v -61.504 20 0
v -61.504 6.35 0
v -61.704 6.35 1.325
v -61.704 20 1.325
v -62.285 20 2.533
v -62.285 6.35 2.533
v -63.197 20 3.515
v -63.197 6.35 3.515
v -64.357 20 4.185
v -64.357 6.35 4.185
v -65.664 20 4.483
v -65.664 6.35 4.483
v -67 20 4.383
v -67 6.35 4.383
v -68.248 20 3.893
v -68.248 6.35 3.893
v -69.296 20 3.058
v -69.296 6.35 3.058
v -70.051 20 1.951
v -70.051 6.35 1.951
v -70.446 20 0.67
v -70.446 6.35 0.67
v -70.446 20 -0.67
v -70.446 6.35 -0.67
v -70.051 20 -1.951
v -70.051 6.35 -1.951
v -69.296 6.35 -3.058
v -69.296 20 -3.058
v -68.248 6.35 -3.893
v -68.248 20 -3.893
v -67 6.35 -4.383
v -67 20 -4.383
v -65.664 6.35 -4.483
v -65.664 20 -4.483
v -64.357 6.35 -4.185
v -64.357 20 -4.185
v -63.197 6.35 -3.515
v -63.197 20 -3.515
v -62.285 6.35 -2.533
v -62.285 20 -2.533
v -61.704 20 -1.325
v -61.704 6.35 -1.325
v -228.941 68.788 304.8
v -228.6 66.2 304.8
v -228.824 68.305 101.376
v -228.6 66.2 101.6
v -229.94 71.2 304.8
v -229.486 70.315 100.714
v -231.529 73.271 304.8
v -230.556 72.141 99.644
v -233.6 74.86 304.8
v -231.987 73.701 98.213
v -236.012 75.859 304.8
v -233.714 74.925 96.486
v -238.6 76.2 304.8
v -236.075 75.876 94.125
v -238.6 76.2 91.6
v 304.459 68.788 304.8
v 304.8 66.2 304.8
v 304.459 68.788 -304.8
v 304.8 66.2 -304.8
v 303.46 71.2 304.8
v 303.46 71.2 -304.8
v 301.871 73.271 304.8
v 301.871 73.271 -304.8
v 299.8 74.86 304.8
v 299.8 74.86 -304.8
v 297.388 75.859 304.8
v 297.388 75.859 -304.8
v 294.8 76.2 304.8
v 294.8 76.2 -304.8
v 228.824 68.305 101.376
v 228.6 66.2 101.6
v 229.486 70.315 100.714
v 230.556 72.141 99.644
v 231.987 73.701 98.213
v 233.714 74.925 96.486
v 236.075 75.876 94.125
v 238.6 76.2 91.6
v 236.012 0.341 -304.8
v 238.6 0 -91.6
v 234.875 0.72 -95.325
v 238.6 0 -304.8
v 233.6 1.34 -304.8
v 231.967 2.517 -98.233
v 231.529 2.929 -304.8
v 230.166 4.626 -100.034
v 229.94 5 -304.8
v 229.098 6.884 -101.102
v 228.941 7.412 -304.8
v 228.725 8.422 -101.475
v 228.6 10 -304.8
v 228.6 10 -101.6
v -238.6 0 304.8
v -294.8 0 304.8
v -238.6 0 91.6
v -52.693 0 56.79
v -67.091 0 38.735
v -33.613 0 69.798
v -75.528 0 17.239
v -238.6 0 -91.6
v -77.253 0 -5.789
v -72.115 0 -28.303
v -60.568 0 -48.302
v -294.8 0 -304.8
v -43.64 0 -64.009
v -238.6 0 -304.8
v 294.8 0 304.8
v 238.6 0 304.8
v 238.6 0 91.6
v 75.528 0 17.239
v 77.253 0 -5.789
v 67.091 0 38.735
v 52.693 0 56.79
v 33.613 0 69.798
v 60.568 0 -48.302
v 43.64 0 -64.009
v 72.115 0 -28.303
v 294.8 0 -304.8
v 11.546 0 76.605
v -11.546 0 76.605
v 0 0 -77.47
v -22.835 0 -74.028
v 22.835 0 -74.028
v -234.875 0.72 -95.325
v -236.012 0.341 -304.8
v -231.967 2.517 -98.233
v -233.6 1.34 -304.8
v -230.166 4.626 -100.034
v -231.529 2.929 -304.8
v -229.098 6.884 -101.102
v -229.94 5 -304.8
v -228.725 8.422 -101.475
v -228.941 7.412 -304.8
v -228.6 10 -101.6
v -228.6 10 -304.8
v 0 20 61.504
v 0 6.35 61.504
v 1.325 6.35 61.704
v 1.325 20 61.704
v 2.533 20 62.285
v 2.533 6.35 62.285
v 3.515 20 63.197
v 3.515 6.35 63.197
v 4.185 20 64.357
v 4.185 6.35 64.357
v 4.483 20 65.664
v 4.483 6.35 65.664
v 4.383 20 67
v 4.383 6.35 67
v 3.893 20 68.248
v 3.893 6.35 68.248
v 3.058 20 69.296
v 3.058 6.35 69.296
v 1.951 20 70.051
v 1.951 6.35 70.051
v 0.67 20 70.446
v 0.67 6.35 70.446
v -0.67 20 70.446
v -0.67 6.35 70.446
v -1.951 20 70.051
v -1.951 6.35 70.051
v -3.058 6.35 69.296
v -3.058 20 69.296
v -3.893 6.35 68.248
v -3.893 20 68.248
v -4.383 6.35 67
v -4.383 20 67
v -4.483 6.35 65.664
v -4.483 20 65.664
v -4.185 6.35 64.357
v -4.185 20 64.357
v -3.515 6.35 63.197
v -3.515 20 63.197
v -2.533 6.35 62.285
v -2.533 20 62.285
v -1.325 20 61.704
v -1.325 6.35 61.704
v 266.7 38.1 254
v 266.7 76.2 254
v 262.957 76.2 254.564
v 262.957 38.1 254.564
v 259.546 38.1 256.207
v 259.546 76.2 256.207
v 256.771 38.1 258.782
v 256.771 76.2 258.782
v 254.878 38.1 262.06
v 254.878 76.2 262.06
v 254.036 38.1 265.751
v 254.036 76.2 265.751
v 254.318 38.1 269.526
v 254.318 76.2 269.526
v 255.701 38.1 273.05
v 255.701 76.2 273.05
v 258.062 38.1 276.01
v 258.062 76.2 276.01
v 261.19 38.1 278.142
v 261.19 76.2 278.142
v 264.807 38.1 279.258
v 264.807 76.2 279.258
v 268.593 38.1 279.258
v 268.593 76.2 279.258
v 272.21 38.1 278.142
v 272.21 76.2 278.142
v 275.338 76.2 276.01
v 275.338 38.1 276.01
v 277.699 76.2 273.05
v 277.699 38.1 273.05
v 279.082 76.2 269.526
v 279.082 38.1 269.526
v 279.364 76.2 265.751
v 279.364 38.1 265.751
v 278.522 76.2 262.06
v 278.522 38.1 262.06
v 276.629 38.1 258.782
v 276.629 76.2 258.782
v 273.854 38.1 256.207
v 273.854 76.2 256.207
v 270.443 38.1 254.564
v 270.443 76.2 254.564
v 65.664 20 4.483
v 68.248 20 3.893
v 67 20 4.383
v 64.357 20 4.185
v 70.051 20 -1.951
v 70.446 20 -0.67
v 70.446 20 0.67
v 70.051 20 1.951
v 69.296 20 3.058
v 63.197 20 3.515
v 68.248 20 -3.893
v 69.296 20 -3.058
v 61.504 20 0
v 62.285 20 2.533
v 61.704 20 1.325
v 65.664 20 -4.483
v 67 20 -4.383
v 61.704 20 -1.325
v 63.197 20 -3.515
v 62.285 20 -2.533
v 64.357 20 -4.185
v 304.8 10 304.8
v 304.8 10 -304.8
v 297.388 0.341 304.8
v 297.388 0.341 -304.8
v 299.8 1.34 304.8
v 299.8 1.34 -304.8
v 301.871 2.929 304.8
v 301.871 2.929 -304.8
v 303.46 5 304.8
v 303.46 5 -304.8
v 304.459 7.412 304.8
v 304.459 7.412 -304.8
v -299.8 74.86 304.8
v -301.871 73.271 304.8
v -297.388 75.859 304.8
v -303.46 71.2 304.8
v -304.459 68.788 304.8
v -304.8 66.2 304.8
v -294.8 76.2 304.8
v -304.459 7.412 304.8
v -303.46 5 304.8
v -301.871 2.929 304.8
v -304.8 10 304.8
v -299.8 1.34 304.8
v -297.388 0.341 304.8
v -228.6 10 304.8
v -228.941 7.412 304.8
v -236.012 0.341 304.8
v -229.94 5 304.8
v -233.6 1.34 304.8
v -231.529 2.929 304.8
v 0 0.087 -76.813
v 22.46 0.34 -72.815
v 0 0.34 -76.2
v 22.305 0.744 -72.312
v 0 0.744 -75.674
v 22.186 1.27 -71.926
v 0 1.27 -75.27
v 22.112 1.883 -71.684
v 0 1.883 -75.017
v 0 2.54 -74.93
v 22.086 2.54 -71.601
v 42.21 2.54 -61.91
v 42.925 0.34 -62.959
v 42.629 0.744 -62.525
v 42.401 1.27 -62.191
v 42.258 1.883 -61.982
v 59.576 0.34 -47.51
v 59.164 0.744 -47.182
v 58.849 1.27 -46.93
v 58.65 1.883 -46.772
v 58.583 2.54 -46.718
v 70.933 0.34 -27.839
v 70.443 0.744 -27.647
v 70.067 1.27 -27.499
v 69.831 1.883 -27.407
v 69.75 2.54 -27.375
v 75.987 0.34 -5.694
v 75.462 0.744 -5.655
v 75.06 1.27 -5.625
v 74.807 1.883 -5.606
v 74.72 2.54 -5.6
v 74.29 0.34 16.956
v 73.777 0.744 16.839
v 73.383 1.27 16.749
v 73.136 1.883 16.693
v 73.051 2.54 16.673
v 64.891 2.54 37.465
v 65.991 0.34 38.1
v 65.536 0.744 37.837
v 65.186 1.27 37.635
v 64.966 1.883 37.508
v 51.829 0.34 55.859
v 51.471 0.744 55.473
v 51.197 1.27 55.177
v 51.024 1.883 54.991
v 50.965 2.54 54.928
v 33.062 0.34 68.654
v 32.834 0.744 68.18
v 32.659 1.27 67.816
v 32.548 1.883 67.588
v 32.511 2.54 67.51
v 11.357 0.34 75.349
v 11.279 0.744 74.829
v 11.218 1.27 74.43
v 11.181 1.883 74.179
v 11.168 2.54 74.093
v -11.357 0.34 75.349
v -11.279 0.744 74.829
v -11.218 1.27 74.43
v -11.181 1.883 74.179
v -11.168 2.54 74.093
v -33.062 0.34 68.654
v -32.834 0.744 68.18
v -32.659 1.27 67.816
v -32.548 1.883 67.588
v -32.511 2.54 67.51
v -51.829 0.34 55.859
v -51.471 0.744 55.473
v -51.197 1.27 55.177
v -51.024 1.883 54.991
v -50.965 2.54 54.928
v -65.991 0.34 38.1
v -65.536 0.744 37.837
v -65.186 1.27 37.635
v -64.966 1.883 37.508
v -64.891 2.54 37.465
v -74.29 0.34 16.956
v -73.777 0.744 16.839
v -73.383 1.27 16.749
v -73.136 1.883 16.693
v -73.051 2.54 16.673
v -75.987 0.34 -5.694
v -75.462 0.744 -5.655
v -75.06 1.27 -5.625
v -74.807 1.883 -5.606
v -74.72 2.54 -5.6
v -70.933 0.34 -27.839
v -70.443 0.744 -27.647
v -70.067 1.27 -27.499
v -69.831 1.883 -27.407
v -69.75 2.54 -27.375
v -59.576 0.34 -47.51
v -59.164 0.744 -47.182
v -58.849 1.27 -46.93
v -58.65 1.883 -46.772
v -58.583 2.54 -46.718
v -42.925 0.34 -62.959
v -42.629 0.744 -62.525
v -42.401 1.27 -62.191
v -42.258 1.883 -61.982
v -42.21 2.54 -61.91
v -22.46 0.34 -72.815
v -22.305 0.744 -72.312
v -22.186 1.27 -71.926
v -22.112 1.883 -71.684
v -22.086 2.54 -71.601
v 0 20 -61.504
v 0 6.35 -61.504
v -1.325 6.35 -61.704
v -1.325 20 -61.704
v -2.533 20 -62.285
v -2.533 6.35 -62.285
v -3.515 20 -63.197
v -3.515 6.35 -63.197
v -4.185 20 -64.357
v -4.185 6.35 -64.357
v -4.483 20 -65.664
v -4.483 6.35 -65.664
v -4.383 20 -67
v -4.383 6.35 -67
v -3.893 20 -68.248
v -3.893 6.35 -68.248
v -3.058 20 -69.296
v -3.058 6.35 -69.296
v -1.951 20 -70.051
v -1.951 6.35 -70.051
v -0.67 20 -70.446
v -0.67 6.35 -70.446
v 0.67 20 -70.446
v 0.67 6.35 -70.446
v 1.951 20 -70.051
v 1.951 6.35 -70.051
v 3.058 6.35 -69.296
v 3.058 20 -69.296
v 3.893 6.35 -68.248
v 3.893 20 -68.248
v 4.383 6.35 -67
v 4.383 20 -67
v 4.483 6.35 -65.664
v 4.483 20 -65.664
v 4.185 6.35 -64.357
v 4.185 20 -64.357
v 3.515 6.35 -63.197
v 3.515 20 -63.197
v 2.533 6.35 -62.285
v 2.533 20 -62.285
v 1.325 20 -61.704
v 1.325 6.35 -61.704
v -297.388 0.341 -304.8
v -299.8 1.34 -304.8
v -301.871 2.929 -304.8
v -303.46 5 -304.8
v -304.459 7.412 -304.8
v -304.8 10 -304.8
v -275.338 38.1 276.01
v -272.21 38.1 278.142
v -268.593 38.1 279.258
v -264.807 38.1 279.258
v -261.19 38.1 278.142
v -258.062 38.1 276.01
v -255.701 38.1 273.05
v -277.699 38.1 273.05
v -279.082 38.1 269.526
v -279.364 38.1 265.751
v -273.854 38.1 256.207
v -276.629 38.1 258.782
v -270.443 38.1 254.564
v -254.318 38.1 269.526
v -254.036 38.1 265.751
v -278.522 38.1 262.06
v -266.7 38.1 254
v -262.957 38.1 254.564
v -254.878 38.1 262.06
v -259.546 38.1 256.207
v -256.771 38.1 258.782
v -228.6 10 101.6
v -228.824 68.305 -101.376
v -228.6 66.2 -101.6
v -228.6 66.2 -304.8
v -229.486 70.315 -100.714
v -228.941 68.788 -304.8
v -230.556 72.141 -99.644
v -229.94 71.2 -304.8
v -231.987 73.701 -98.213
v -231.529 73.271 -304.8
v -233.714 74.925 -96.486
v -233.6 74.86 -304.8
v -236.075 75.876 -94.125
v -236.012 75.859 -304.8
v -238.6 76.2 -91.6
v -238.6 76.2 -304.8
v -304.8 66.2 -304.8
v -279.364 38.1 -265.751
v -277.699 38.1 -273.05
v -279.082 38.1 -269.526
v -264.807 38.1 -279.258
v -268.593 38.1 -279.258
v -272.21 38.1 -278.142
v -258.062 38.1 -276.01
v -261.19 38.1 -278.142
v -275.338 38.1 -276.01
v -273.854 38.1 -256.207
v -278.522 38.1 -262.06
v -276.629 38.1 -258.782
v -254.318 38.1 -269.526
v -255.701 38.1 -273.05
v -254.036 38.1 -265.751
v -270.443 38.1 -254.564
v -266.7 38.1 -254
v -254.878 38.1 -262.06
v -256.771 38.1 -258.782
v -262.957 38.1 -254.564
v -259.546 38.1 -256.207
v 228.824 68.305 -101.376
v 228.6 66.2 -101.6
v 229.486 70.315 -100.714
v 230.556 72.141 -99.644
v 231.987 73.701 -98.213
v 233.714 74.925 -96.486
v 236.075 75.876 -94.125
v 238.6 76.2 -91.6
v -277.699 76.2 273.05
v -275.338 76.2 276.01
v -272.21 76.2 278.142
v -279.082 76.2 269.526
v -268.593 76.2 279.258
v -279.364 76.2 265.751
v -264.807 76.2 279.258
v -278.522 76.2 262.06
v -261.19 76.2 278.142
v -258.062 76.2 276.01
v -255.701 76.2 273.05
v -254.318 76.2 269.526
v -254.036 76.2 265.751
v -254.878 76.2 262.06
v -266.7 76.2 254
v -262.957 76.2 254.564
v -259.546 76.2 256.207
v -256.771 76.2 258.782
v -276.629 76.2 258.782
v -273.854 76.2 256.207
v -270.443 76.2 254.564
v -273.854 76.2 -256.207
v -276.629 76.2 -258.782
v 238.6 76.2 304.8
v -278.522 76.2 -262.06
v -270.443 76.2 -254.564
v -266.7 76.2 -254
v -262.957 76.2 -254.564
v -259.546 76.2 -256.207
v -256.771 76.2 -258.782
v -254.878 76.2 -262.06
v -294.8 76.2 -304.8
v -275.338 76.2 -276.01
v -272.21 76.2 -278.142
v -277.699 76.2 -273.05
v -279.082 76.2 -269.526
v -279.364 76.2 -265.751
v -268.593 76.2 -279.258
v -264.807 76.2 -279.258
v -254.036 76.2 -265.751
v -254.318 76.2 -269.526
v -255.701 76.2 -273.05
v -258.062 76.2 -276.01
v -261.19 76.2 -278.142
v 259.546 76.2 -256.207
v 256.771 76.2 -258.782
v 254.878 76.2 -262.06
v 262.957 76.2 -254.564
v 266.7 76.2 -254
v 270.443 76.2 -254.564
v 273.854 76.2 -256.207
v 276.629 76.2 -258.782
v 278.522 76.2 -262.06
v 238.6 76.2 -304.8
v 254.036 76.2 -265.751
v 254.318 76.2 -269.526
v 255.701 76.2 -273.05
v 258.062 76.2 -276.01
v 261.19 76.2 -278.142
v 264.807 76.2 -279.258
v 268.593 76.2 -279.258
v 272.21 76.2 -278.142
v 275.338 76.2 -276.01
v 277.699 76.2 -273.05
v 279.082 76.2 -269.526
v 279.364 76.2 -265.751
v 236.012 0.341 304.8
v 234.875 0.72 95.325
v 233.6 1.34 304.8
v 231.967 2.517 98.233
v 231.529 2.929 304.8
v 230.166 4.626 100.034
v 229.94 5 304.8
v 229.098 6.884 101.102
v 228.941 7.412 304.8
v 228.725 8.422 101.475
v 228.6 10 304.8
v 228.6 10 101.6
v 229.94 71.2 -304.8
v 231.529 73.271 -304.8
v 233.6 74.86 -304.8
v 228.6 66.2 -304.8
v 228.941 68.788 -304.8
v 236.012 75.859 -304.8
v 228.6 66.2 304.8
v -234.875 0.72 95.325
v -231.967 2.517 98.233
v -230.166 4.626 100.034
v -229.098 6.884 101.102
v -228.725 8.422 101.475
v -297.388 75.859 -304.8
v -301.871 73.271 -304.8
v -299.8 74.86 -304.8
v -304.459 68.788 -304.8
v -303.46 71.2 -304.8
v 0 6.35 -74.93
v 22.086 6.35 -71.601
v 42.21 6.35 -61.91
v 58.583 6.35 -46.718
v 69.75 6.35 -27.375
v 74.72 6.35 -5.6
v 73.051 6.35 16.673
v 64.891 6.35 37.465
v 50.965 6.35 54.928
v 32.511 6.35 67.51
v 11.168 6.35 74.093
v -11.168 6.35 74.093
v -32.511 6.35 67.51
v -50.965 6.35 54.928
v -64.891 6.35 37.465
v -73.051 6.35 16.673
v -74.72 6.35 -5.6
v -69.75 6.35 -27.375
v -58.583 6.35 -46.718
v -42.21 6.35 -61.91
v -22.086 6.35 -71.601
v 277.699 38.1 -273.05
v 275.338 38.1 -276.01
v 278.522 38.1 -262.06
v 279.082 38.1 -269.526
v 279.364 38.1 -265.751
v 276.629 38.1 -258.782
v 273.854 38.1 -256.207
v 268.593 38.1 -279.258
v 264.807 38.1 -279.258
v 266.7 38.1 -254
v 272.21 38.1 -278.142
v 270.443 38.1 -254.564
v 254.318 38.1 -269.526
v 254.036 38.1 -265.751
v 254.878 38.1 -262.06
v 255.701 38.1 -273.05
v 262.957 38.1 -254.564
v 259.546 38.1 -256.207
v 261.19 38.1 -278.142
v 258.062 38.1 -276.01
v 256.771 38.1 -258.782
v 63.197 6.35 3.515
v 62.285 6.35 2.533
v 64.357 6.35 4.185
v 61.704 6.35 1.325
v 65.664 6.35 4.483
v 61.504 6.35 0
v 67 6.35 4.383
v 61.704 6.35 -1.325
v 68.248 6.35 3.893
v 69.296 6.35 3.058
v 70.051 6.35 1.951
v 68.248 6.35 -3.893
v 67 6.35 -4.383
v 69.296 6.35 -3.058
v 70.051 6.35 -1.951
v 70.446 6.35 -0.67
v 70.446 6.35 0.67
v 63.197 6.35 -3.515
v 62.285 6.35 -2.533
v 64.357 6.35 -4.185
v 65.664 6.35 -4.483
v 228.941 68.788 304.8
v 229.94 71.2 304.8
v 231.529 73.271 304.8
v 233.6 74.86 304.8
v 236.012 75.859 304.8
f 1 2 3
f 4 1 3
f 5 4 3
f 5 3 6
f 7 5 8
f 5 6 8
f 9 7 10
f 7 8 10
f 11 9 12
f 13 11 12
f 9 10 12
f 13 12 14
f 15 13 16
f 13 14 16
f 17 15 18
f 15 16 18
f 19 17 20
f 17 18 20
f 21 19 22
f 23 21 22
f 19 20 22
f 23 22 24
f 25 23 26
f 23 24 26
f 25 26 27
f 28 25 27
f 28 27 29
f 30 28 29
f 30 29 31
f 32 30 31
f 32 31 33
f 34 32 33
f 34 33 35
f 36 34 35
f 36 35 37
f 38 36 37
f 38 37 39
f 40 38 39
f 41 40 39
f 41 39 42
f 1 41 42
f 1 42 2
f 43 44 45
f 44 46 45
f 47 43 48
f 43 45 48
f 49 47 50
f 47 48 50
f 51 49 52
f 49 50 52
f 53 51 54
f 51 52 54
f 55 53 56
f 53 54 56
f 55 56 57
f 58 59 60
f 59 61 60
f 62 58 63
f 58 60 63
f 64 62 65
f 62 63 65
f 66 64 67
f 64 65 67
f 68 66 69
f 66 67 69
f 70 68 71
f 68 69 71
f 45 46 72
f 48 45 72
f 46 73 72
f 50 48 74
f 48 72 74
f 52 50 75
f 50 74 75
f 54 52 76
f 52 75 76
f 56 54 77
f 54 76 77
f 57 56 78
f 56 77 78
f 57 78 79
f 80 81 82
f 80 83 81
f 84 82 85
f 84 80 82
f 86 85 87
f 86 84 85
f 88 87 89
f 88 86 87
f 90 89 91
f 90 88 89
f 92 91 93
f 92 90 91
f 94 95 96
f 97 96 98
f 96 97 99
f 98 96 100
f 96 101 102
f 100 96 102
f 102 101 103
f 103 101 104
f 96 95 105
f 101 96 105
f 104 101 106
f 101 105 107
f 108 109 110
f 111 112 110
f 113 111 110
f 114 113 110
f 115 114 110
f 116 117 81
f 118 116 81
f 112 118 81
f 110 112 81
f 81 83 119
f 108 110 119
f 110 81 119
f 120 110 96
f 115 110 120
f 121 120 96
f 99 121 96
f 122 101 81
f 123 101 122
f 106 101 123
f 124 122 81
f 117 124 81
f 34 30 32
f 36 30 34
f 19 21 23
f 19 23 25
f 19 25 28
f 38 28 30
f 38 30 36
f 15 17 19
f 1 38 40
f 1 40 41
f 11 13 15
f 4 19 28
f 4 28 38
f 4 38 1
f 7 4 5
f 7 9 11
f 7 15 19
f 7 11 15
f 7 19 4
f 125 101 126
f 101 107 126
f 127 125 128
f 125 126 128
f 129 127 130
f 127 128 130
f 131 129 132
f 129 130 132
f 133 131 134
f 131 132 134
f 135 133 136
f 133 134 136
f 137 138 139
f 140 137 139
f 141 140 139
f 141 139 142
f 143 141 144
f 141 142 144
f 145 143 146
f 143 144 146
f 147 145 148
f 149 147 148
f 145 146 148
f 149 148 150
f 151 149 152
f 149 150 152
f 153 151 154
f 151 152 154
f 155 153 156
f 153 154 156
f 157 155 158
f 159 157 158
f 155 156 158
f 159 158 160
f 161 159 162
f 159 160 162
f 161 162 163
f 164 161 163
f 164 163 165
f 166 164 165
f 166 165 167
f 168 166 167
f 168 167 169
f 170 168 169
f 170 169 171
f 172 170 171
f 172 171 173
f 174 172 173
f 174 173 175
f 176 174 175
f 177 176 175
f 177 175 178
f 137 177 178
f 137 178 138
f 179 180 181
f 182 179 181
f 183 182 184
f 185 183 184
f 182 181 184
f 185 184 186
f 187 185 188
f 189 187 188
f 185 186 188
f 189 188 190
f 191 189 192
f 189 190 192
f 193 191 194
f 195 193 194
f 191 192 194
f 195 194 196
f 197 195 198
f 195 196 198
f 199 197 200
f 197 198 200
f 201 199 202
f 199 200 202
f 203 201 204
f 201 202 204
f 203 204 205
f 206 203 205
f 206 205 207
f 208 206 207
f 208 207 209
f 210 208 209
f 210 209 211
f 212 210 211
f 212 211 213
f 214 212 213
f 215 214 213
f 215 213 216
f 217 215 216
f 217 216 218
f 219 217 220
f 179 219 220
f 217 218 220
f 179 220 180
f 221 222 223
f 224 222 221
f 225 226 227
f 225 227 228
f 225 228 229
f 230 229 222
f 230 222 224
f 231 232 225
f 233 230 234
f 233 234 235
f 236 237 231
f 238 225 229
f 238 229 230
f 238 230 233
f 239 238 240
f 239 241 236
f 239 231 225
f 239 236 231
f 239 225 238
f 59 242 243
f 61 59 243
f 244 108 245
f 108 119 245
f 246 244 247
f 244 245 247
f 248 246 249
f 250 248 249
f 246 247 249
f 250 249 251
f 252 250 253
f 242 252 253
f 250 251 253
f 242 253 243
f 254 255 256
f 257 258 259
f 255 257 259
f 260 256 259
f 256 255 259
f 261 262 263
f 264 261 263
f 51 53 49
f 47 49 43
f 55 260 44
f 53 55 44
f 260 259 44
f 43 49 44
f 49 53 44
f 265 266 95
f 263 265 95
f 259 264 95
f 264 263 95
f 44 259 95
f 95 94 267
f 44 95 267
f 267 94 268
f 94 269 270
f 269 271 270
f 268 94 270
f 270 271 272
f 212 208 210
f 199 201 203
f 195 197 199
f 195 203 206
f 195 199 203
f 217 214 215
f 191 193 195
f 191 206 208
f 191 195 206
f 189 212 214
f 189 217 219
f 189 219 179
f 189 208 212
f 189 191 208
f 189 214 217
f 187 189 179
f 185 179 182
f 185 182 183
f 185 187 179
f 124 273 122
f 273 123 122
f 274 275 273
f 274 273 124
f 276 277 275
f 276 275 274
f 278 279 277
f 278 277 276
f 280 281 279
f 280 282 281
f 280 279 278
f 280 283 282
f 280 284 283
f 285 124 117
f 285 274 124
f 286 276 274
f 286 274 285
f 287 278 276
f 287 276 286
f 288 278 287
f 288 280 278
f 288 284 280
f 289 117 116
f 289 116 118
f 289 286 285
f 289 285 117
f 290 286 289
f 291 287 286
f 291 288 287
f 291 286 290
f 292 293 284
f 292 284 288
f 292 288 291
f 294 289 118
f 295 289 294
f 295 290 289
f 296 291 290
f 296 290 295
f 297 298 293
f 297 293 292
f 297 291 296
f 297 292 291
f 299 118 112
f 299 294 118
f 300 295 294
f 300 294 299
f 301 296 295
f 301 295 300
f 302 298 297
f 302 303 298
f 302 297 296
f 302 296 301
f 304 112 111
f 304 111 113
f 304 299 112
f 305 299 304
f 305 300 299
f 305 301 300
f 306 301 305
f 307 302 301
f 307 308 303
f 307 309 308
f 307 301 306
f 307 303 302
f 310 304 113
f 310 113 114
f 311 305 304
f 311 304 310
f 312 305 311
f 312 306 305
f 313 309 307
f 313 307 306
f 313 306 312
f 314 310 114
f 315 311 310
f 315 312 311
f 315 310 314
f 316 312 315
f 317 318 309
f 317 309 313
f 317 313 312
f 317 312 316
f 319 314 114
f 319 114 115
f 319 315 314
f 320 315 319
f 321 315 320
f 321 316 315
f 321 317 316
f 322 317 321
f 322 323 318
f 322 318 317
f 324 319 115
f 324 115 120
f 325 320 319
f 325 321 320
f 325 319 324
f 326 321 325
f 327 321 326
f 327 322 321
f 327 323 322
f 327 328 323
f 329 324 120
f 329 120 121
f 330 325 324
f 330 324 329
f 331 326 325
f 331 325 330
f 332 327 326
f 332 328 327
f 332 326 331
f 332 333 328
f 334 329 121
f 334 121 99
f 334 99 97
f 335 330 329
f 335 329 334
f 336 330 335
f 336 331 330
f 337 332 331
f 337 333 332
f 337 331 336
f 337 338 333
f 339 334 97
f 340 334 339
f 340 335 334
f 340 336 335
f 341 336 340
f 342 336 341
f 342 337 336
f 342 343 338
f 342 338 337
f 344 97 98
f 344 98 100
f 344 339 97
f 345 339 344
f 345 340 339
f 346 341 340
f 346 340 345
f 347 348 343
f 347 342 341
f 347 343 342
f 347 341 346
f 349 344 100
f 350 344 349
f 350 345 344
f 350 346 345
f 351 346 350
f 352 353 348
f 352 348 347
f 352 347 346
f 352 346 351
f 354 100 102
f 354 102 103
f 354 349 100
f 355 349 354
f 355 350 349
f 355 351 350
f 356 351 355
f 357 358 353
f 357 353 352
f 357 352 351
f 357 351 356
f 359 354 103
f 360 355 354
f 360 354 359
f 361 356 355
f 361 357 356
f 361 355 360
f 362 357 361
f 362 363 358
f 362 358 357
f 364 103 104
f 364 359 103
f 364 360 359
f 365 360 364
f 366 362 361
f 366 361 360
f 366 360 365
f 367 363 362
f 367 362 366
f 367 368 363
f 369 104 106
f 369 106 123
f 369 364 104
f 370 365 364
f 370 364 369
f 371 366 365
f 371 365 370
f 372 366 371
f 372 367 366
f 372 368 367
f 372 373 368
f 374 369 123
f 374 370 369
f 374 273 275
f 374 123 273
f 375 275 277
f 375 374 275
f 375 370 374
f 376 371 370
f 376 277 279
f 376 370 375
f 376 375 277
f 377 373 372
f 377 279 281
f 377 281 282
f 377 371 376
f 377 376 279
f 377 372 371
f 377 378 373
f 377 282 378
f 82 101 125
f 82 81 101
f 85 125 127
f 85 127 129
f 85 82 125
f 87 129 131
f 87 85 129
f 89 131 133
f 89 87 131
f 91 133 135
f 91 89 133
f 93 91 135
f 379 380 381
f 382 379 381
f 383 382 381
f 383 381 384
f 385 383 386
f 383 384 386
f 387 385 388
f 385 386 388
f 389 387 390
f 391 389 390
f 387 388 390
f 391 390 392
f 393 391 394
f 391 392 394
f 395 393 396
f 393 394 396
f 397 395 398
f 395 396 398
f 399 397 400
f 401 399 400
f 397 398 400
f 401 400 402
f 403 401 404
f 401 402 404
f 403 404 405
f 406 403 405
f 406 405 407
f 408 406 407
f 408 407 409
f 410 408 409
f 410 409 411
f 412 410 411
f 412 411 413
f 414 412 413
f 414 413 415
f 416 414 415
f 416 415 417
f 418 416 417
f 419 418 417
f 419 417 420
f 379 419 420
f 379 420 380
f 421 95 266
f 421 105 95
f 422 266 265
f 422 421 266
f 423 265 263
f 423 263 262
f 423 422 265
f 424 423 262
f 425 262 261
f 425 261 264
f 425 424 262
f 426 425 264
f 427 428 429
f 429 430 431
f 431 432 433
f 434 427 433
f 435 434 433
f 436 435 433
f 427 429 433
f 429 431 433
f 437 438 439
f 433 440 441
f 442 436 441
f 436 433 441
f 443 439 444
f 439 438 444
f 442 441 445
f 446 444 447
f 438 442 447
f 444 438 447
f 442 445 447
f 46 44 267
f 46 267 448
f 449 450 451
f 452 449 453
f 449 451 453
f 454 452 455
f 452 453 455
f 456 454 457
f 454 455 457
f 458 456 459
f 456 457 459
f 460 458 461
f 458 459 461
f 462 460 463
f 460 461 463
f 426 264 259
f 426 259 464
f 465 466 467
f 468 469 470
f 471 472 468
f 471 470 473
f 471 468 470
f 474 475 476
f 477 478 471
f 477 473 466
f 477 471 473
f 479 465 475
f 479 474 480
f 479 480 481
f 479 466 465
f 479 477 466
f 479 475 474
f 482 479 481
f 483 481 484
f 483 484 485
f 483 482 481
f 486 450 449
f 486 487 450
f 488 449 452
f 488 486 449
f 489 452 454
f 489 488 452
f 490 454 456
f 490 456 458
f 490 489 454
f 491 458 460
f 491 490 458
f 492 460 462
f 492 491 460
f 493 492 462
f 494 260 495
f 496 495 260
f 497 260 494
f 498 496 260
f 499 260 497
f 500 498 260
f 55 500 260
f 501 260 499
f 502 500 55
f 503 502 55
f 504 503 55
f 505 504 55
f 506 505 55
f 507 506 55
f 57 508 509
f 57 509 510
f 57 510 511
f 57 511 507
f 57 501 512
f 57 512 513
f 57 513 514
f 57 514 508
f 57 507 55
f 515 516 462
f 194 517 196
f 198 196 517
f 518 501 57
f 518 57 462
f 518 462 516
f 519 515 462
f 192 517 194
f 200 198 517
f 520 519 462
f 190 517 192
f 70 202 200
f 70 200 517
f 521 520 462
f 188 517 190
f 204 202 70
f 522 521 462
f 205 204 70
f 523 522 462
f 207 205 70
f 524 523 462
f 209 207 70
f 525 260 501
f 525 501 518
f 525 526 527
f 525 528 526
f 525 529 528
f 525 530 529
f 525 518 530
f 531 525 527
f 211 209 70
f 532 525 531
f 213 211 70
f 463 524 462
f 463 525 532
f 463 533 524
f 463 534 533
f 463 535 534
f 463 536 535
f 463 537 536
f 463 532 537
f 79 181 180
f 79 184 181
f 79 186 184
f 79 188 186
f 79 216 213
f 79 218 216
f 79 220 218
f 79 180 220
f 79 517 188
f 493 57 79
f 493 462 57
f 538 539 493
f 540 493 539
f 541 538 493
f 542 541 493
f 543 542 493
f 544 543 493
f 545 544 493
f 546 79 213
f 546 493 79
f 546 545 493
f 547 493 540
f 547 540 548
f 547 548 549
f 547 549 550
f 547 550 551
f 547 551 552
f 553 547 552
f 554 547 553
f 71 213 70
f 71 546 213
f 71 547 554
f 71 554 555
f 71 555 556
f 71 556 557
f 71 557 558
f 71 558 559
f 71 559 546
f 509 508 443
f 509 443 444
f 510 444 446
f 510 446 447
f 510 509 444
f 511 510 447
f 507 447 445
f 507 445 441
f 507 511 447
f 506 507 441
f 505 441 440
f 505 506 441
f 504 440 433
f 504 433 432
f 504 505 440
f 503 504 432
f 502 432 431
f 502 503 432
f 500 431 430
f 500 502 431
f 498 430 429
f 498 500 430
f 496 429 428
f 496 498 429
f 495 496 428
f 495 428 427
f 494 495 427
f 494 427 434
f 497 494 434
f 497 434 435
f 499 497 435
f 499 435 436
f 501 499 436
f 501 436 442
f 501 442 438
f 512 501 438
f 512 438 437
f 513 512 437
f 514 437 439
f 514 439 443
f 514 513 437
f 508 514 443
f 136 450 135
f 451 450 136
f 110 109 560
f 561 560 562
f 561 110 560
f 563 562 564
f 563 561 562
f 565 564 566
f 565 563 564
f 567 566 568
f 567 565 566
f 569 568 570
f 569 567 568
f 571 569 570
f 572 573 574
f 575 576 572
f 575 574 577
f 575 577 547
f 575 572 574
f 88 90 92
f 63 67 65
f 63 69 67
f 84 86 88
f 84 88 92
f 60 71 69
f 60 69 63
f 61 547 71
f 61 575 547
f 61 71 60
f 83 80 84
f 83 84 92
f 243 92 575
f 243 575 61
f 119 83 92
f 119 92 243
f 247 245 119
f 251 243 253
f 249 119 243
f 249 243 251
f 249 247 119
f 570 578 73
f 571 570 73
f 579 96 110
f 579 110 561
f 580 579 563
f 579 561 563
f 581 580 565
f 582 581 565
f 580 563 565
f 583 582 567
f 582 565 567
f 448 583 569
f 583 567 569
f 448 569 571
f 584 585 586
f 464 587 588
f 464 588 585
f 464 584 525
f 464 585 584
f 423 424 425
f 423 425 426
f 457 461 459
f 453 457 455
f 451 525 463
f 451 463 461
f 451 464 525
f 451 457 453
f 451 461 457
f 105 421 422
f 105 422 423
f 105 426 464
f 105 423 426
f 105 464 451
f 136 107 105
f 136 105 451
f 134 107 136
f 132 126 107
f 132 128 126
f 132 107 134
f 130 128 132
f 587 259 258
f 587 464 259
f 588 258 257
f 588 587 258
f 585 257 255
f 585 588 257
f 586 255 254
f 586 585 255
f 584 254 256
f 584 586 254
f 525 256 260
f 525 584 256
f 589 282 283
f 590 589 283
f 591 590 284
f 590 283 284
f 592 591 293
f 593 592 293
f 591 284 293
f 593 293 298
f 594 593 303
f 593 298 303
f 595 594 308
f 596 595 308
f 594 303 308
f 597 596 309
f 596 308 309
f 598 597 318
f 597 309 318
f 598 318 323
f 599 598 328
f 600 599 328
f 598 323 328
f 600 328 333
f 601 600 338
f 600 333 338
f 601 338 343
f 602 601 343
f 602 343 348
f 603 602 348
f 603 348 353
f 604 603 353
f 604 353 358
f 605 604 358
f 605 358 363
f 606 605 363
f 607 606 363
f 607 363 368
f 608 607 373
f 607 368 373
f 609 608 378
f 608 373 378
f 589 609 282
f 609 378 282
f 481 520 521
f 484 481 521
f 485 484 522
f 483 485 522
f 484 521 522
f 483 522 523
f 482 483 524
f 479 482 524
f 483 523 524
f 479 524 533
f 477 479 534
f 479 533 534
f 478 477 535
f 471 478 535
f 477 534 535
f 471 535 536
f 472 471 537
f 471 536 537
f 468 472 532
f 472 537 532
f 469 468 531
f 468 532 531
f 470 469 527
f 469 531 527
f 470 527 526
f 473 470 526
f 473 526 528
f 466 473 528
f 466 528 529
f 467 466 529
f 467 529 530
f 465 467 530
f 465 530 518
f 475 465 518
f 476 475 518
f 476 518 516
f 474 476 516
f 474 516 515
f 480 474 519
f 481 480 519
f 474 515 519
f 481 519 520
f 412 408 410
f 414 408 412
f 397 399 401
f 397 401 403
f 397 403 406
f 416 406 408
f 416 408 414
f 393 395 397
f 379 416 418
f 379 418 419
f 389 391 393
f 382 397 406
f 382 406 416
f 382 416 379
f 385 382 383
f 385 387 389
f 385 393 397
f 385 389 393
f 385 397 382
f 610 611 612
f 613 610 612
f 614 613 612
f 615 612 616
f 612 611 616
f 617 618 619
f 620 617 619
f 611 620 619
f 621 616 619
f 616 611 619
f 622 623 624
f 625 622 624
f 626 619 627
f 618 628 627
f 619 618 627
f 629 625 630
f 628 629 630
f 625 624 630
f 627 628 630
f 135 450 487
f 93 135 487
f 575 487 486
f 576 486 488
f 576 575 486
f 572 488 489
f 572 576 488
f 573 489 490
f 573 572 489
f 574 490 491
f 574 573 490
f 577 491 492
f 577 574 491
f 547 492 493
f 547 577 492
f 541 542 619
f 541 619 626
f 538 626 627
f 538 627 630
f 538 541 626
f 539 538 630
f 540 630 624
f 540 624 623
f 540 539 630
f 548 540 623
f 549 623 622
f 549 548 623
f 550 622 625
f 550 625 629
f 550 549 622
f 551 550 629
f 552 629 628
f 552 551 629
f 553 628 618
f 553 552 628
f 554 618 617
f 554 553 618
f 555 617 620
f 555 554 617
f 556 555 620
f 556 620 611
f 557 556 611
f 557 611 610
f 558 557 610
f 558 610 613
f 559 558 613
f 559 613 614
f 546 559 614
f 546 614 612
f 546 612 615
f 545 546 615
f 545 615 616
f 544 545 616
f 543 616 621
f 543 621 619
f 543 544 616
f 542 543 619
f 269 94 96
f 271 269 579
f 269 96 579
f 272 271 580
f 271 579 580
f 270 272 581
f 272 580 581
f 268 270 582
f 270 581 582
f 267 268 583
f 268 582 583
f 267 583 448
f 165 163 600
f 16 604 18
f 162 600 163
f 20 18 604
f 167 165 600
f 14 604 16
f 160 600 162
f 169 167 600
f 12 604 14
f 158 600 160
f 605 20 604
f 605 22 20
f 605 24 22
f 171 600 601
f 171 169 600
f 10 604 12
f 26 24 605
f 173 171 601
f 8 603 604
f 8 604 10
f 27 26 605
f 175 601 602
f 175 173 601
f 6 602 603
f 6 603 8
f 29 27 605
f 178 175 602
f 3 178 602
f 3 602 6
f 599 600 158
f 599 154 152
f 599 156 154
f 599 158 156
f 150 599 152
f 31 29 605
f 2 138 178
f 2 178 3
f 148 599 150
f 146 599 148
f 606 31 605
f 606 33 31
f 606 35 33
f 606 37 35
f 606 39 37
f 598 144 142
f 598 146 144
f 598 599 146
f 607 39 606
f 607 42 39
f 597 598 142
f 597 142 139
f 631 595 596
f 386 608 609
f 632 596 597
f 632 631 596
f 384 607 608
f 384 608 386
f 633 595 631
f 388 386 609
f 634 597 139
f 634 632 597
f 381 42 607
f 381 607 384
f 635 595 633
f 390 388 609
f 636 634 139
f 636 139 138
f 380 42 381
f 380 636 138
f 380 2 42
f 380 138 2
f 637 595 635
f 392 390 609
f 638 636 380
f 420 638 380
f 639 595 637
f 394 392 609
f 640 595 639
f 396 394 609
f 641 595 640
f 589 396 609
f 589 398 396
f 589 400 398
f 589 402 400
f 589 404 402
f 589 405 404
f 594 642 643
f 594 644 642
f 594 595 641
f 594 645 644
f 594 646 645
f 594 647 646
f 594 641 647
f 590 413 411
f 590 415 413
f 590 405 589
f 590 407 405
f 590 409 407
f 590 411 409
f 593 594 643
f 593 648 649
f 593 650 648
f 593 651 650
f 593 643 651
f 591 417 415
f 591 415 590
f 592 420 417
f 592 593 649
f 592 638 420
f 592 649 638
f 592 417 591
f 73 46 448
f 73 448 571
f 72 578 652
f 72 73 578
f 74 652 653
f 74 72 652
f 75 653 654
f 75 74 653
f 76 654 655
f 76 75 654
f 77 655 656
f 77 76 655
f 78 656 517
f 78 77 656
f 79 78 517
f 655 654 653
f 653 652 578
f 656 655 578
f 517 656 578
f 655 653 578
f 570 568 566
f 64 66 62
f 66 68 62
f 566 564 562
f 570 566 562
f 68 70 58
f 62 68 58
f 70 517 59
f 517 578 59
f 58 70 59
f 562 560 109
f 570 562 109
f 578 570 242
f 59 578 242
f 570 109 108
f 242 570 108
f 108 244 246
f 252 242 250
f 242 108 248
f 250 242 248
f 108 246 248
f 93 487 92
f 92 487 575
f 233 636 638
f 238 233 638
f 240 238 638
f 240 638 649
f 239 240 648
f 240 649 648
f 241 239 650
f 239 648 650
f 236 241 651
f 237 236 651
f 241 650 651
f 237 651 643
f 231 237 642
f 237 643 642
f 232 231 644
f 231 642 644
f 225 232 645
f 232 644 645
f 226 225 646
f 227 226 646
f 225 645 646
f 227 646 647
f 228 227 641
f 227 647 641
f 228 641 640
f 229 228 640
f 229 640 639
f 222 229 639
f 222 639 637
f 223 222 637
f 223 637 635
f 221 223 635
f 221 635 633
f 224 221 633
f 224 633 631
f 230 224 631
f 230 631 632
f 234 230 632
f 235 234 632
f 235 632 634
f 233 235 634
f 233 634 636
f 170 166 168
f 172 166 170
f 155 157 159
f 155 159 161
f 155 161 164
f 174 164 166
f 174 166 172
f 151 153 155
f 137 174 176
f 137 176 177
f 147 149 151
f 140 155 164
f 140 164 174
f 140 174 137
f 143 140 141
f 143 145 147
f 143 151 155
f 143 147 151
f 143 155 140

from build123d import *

# Parameters (mm, degrees)
SKETCH1_W                                  = 609.6
SKETCH1_H                                  = 609.6
BOSS_EXTRUDE1_DEPTH                        = 76.2
SKETCH2_W                                  = 457.2
SKETCH2_H                                  = 203.2
CUT_EXTRUDE1_DEPTH                         = 76.2
SKETCH3_R                                  = 12.7
CUT_EXTRUDE2_DEPTH                         = 38.1
MIRROR1_AT_THE_SECOND_PLANE_COPY_1_SKETC_R = 12.7
MIRROR1_AT_THE_SECOND_PLANE_COPY_1_DEPTH   = 38.1
SKETCH6_R                                  = 74.93
CUT_EXTRUDE3_DEPTH                         = 6.35
FILLET1_R                                  = 2.54
SKETCH7_R                                  = 4.4958
CUT_EXTRUDE4_DEPTH                         = 20
CIRPATTERN1_COUNT                          = 4
FILLET2_R                                  = 10


with BuildPart() as part:
    # Sketch1 → Boss-Extrude1 (new body)
    with BuildSketch(Plane(origin=(0, 0, 0), x_dir=(1, 0, 0), z_dir=(0, 1, 0))):
        Rectangle(SKETCH1_W, SKETCH1_H)
    extrude(amount=BOSS_EXTRUDE1_DEPTH)

    # Sketch2 → Cut-Extrude1 (cut)
    with BuildSketch(Plane(origin=(0, 76.2, 0), x_dir=(1, 0, 0), z_dir=(0, 1, 0))):
        with Locations((0, -203.2)):
            Rectangle(SKETCH2_W, SKETCH2_H)
        with Locations((0, 203.2)):
            Rectangle(SKETCH2_W, SKETCH2_H)
    extrude(amount=-CUT_EXTRUDE1_DEPTH, mode=Mode.SUBTRACT)

    # Sketch3 → Cut-Extrude2 (cut)
    with BuildSketch(Plane(origin=(0, 76.2, 0), x_dir=(1, 0, 0), z_dir=(0, 1, 0))):
        with Locations(Location((-266.7, 266.7, 0), (0, 0, 270))):
            Circle(SKETCH3_R)
    cut_extrude2 = extrude(amount=-CUT_EXTRUDE2_DEPTH, mode=Mode.SUBTRACT)

    # Mirror1: Cut-Extrude2 across plane
    add(cut_extrude2.mirror(Plane(origin=(0, 0, 0), x_dir=(0, 0, 1), z_dir=(1, 0, 0))), mode=Mode.SUBTRACT)

    # Mirror1 at the second plane: Cut-Extrude2 across plane
    add(cut_extrude2.mirror(Plane.XY), mode=Mode.SUBTRACT)

    # Mirror1 at the second plane copy 1 sketc → Mirror1 at the second plane copy 1 (cut)
    with BuildSketch(Plane(origin=(0, 76.2, 0), x_dir=(-1, 0, 0), z_dir=(0, 1, 0))):
        with Locations(Location((-266.7, 266.7, 0), (0, 0, 270))):
            Circle(MIRROR1_AT_THE_SECOND_PLANE_COPY_1_SKETC_R)
    extrude(amount=-MIRROR1_AT_THE_SECOND_PLANE_COPY_1_DEPTH, mode=Mode.SUBTRACT)

    # Sketch6 → Cut-Extrude3 (cut)
    with BuildSketch(Plane.XZ):
        with Locations(Location((0, 0, 0), (0, 0, 270))):
            Circle(SKETCH6_R)
    extrude(amount=-CUT_EXTRUDE3_DEPTH, mode=Mode.SUBTRACT)

    # Fillet1
    fillet1_edges = [part.edges().sort_by_distance(p)[0] for p in [
        (0, 0, 74.93),
    ]]
    fillet(fillet1_edges, radius=FILLET1_R)

    # Sketch7 → Cut-Extrude4 (cut)
    with BuildSketch(Plane.XZ):
        with Locations(Location((0, 66, 0), (0, 0, 270))):
            Circle(SKETCH7_R)
    cut_extrude4 = extrude(amount=-CUT_EXTRUDE4_DEPTH, mode=Mode.SUBTRACT)

    # CirPattern1: Cut-Extrude4 ×4 about axis
    cirpattern1_axis = Axis((0, 0, 0), (0, 1, 0))
    for i in range(1, CIRPATTERN1_COUNT):
        add(cut_extrude4.rotate(cirpattern1_axis, i * 360 / CIRPATTERN1_COUNT), mode=Mode.SUBTRACT)

    # Fillet2
    fillet2_edges = [part.edges().sort_by_distance(p)[0] for p in [
        (-304.8, 76.2, 0),
        (-228.6, 0, 203.2),
        (0, 0, 101.6),
        (228.6, 0, 203.2),
        (-228.6, 76.2, 203.2),
        (228.6, 76.2, 203.2),
        (0, 76.2, 101.6),
        (-228.6, 0, -203.2),
        (228.6, 0, -203.2),
        (0, 0, -101.6),
        (-228.6, 76.2, -203.2),
        (0, 76.2, -101.6),
        (228.6, 76.2, -203.2),
        (304.8, 76.2, 0),
        (-304.8, 0, 0),
        (304.8, 0, 0),
    ]]
    fillet(fillet2_edges, radius=FILLET2_R)


solid = part.part
